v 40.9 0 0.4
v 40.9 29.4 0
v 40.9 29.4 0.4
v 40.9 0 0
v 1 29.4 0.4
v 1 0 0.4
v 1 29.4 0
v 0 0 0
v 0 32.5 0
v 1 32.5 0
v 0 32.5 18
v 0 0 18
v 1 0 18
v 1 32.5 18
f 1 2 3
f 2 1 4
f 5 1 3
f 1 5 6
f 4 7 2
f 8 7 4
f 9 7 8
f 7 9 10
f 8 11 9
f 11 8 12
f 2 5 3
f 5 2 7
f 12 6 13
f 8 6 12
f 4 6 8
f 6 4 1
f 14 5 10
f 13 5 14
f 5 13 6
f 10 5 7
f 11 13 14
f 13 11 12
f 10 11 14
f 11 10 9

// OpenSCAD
module coil(core){
    if(core){
        difference(){
            cube([40.9, 29.4, 0.4]);
            translate([6.97, 9.7, -0.05]){
                cube([27, 10, 0.5]);
            }
        }
    }else{
        cube([40.9, 29.4, 0.4]);
    }
}


module coilCard(){
    cube([1, 32.5, 18]);
}

coil();

coilCard();
